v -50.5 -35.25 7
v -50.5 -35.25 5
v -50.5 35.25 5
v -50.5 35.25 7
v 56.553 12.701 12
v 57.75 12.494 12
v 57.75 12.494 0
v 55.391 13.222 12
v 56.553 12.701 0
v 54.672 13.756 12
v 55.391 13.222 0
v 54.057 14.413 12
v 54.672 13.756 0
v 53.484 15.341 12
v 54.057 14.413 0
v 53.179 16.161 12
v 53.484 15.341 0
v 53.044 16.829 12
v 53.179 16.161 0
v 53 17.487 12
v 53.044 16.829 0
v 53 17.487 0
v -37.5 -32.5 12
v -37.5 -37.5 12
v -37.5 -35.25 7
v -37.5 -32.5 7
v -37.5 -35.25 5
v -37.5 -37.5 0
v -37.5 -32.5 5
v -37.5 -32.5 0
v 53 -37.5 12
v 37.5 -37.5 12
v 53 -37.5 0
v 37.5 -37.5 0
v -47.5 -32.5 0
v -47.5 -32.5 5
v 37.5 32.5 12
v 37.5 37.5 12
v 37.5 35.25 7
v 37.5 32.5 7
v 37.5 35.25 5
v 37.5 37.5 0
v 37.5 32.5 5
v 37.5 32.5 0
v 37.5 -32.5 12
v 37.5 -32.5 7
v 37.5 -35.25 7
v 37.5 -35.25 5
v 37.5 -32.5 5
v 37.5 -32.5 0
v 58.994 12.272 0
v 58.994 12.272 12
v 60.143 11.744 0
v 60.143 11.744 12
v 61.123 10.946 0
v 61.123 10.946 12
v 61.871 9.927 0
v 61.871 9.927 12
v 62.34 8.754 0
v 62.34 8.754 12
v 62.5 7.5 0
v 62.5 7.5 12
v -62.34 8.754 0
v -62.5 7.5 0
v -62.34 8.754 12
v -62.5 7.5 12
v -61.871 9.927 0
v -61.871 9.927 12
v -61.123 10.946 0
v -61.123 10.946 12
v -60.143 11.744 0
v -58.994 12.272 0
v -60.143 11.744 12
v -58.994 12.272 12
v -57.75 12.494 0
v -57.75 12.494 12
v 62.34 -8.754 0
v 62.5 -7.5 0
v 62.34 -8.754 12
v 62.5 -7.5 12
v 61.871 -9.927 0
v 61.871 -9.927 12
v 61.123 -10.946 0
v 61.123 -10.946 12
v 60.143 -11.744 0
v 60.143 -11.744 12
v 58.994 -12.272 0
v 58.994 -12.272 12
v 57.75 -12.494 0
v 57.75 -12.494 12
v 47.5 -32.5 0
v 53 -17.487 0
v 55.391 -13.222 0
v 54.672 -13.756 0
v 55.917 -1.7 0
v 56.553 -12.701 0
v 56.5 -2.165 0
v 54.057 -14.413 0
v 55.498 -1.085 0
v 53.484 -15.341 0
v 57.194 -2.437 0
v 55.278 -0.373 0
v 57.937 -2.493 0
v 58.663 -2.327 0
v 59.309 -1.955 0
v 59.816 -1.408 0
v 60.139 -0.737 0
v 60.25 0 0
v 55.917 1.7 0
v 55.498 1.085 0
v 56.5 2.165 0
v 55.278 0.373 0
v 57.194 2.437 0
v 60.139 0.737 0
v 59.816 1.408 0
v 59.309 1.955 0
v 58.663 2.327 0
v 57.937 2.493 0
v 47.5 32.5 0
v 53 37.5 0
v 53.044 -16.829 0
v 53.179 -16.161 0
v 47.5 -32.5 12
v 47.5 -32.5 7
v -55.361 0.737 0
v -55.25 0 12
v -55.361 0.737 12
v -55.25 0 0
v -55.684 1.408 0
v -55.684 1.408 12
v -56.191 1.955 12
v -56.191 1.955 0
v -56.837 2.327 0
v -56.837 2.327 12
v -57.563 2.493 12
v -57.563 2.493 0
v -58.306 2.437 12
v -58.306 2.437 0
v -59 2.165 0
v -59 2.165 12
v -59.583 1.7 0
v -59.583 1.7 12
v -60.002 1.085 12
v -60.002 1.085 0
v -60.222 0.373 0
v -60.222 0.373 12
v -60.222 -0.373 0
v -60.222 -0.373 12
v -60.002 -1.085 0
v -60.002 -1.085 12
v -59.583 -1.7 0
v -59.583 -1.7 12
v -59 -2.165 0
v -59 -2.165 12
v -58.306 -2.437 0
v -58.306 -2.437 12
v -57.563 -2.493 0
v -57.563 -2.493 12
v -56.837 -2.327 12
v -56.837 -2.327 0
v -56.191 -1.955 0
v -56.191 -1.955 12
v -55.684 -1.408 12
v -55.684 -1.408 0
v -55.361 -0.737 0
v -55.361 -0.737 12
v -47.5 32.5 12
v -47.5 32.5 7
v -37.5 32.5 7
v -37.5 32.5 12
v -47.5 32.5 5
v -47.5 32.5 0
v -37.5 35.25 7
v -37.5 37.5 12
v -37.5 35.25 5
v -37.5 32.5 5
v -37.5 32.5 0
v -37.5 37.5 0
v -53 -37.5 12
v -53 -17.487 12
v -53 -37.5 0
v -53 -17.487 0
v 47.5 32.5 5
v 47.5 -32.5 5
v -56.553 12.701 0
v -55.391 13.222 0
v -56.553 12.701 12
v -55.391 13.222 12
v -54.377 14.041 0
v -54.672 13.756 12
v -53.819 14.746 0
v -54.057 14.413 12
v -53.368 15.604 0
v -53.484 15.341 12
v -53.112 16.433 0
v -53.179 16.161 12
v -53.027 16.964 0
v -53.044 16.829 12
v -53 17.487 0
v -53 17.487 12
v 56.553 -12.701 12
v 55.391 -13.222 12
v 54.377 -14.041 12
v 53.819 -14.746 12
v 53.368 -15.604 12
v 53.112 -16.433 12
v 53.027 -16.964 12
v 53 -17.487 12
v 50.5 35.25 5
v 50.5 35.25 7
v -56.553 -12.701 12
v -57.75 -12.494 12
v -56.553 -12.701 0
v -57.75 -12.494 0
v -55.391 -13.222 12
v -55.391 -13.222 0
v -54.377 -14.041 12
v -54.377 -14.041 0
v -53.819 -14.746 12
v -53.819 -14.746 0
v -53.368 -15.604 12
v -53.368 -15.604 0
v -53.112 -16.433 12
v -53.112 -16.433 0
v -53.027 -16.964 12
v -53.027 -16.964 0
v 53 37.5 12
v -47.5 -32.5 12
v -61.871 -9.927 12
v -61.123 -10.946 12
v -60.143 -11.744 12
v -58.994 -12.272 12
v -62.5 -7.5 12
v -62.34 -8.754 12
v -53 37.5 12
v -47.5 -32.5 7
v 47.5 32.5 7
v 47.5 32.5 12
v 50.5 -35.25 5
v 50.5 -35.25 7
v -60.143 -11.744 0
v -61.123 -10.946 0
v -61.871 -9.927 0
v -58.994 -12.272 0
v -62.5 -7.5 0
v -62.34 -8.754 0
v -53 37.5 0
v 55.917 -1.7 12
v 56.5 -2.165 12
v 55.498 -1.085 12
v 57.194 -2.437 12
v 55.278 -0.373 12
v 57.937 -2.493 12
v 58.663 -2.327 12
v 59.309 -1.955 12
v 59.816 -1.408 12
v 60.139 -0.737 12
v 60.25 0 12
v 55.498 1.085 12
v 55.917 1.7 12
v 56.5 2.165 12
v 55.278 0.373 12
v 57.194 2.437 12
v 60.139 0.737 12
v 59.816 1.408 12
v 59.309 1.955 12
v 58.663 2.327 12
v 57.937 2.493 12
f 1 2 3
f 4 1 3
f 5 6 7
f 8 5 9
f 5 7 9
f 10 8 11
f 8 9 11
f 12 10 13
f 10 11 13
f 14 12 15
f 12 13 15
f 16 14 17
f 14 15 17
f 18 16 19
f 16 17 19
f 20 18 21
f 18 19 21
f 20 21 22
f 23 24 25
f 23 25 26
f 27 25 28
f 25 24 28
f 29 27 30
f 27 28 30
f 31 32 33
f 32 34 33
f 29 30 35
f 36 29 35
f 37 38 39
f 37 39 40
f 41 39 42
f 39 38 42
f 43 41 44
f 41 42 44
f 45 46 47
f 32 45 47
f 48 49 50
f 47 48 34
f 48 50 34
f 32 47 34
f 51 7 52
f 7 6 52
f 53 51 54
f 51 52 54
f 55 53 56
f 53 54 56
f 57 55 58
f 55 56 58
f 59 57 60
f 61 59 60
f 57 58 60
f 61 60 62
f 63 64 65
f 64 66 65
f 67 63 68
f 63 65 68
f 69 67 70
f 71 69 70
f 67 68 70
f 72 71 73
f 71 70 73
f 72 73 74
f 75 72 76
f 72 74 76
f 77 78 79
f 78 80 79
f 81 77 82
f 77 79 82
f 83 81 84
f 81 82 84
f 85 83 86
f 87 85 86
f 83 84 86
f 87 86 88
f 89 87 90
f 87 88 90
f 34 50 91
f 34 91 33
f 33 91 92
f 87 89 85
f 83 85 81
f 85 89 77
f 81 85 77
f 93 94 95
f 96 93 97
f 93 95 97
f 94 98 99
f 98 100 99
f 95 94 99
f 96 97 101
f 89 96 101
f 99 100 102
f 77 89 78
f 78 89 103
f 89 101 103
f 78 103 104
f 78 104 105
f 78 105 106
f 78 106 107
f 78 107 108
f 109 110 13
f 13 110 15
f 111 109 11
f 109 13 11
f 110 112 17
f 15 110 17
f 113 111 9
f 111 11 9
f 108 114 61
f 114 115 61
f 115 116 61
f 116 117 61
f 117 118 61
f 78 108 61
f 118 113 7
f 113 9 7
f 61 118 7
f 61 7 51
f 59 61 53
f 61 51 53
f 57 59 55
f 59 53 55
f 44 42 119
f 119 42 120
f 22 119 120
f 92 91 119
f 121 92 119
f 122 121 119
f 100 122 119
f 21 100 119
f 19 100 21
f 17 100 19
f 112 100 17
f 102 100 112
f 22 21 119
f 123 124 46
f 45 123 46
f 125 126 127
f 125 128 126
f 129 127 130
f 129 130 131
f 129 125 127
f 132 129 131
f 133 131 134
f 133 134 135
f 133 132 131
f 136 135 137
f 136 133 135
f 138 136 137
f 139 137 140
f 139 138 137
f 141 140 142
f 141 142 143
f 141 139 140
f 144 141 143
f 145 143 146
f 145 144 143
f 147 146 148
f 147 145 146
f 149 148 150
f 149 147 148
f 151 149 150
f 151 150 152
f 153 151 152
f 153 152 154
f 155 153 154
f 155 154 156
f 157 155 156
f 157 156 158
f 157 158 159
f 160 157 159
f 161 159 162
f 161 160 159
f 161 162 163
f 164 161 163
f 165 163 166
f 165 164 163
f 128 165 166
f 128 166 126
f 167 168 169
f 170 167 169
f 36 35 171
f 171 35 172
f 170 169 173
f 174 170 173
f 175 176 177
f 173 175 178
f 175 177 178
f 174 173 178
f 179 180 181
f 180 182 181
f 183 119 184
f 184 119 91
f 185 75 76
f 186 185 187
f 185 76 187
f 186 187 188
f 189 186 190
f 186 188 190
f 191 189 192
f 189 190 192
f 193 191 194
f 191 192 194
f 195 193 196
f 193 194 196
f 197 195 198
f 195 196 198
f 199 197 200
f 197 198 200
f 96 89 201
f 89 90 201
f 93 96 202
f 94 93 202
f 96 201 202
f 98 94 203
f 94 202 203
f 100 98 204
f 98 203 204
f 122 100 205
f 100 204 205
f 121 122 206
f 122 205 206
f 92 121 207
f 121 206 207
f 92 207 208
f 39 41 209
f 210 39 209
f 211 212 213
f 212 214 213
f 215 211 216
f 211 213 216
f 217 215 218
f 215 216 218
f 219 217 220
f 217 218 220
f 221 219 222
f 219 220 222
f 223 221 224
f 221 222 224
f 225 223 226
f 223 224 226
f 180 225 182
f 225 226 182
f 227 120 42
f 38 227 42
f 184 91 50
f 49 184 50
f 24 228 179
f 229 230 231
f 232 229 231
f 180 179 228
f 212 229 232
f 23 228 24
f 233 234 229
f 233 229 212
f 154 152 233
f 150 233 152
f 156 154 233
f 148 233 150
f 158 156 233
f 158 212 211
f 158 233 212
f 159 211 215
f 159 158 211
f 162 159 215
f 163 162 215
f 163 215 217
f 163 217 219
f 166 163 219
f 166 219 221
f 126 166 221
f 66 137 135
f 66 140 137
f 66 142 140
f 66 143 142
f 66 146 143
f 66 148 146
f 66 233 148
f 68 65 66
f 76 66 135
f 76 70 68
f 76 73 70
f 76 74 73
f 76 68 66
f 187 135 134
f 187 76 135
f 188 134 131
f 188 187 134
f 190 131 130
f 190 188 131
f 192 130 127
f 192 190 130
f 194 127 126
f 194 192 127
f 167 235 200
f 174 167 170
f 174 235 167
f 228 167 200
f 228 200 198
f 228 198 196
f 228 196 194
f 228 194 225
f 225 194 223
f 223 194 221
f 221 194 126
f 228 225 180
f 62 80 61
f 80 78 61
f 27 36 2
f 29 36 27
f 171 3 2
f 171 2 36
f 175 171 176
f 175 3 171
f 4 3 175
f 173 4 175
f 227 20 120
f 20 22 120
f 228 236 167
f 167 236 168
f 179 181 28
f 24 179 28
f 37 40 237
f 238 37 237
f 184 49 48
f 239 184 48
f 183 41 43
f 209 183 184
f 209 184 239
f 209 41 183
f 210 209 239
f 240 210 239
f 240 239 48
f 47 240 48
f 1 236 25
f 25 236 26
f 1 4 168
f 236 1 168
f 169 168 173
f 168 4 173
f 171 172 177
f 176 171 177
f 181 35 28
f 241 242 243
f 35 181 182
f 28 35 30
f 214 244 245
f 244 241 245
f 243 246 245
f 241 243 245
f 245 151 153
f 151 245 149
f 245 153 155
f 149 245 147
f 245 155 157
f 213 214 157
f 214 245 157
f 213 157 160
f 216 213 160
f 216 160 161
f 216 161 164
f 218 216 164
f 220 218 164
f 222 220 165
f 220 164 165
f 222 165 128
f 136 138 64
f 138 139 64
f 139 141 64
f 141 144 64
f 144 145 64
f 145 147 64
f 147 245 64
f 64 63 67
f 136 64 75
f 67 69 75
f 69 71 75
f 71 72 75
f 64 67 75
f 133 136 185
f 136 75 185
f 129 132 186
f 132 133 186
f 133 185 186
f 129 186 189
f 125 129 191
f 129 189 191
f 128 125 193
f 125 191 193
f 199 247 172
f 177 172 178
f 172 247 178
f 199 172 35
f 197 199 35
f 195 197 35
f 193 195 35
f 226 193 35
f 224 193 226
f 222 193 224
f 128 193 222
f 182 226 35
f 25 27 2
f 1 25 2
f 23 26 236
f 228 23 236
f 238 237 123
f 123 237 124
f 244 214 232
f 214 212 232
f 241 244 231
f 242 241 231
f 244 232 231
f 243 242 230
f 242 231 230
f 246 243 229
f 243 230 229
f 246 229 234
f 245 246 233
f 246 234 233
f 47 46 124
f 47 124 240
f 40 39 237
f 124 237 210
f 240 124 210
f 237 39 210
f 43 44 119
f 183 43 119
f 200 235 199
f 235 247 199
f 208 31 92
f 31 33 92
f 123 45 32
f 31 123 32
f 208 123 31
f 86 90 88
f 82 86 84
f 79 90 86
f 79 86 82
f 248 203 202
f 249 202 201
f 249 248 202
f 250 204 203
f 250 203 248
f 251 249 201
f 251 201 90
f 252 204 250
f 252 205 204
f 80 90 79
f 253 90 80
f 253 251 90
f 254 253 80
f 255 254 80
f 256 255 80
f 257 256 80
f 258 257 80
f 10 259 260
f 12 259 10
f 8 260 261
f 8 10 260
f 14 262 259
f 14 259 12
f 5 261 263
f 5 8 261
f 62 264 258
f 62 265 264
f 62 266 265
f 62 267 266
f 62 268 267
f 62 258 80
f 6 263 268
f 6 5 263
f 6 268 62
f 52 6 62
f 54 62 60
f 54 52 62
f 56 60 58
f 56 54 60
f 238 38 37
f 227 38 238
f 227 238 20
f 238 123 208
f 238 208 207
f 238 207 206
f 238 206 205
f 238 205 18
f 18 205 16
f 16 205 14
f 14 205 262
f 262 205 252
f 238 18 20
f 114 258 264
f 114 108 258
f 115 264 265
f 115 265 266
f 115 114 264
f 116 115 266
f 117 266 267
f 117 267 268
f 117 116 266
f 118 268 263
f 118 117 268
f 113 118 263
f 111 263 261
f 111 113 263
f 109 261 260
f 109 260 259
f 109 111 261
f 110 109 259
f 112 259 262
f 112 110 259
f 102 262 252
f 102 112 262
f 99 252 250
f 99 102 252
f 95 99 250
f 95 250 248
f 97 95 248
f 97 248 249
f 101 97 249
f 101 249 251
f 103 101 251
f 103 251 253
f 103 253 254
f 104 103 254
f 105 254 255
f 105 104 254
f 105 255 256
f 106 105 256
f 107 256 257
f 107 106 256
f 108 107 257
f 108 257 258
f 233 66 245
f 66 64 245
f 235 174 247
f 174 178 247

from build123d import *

# Parameters (mm, degrees)
F1_DEPTH = 5
F0_R     = 2.5
F2_DEPTH = 7
F3_START = 7
F3_DEPTH = 5
F4_R     = 5
F4_2_R   = 5
F5_R     = 5
F5_2_R   = 5


with BuildPart() as f1:
    # F0 (on Top) → F1 (new body)
    with BuildSketch(Plane.XY):
        Polygon((-37.5, 35.25), (-50.5, 35.25), (-50.5, -35.25), (-37.5, -35.25), (-37.5, -32.5), (-47.5, -32.5), (-47.5, 32.5), (-37.5, 32.5), align=None)
    extrude(amount=F1_DEPTH)

    # F0 (on Top) → F2 (join)
    with BuildSketch(Plane.XY):
        Polygon((-50.5, -35.25), (-50.5, 35.25), (-37.5, 35.25), (-37.5, 37.5), (-53, 37.5), (-53, 12.5), (-62.5, 12.5), (-62.5, -12.5), (-53, -12.5), (-53, -37.5), (-37.5, -37.5), (-37.5, -35.25), align=None)
        with Locations((-57.75, 0)):
            Circle(F0_R, mode=Mode.SUBTRACT)
    extrude(amount=F2_DEPTH)

    # F0 (on Top) → F3 (join)
    with BuildSketch(Plane.XY.offset(F3_START)):
        Polygon((-50.5, -35.25), (-50.5, 35.25), (-37.5, 35.25), (-37.5, 37.5), (-53, 37.5), (-53, 12.5), (-62.5, 12.5), (-62.5, -12.5), (-53, -12.5), (-53, -37.5), (-37.5, -37.5), (-37.5, -35.25), align=None)
        with Locations((-57.75, 0)):
            Circle(F0_R, mode=Mode.SUBTRACT)
        Polygon((-37.5, 35.25), (-50.5, 35.25), (-50.5, -35.25), (-37.5, -35.25), (-37.5, -32.5), (-47.5, -32.5), (-47.5, 32.5), (-37.5, 32.5), align=None)
    extrude(amount=F3_DEPTH)

    # F4
    f4_edges = [f1.edges().sort_by_distance(p)[0] for p in [
        (-62.5, -12.5, 6),
        (-62.5, 12.5, 6),
    ]]
    fillet(f4_edges, radius=F4_R)

    # F5
    f5_edges = [f1.edges().sort_by_distance(p)[0] for p in [
        (-53, 12.5, 6),
        (-53, -12.5, 6),
    ]]
    fillet(f5_edges, radius=F5_R)


with BuildPart() as f1b:
    # F0 (on Top) → F1, piece 2 (new body)
    with BuildSketch(Plane.XY):
        Polygon((50.5, -35.25), (50.5, 35.25), (37.5, 35.25), (37.5, 32.5), (47.5, 32.5), (47.5, -32.5), (37.5, -32.5), (37.5, -35.25), align=None)
    extrude(amount=F1_DEPTH)

    # F0 (on Top) → F2, piece 2 (join)
    with BuildSketch(Plane.XY):
        Polygon((37.5, 35.25), (50.5, 35.25), (50.5, -35.25), (37.5, -35.25), (37.5, -37.5), (53, -37.5), (53, -12.5), (62.5, -12.5), (62.5, 12.5), (53, 12.5), (53, 37.5), (37.5, 37.5), align=None)
        with Locations((57.75, 0)):
            Circle(F0_R, mode=Mode.SUBTRACT)
    extrude(amount=F2_DEPTH)

    # F0 (on Top) → F3, piece 2 (join)
    with BuildSketch(Plane.XY.offset(F3_START)):
        Polygon((37.5, 35.25), (50.5, 35.25), (50.5, -35.25), (37.5, -35.25), (37.5, -37.5), (53, -37.5), (53, -12.5), (62.5, -12.5), (62.5, 12.5), (53, 12.5), (53, 37.5), (37.5, 37.5), align=None)
        with Locations((57.75, 0)):
            Circle(F0_R, mode=Mode.SUBTRACT)
        Polygon((50.5, -35.25), (50.5, 35.25), (37.5, 35.25), (37.5, 32.5), (47.5, 32.5), (47.5, -32.5), (37.5, -32.5), (37.5, -35.25), align=None)
    extrude(amount=F3_DEPTH)

    # F4#2
    f4_2_edges = [f1b.edges().sort_by_distance(p)[0] for p in [
        (62.5, -12.5, 6),
        (62.5, 12.5, 6),
    ]]
    fillet(f4_2_edges, radius=F4_2_R)

    # F5#2
    f5_2_edges = [f1b.edges().sort_by_distance(p)[0] for p in [
        (53, 12.5, 6),
        (53, -12.5, 6),
    ]]
    fillet(f5_2_edges, radius=F5_2_R)


solid = Compound([f1.part, f1b.part])
